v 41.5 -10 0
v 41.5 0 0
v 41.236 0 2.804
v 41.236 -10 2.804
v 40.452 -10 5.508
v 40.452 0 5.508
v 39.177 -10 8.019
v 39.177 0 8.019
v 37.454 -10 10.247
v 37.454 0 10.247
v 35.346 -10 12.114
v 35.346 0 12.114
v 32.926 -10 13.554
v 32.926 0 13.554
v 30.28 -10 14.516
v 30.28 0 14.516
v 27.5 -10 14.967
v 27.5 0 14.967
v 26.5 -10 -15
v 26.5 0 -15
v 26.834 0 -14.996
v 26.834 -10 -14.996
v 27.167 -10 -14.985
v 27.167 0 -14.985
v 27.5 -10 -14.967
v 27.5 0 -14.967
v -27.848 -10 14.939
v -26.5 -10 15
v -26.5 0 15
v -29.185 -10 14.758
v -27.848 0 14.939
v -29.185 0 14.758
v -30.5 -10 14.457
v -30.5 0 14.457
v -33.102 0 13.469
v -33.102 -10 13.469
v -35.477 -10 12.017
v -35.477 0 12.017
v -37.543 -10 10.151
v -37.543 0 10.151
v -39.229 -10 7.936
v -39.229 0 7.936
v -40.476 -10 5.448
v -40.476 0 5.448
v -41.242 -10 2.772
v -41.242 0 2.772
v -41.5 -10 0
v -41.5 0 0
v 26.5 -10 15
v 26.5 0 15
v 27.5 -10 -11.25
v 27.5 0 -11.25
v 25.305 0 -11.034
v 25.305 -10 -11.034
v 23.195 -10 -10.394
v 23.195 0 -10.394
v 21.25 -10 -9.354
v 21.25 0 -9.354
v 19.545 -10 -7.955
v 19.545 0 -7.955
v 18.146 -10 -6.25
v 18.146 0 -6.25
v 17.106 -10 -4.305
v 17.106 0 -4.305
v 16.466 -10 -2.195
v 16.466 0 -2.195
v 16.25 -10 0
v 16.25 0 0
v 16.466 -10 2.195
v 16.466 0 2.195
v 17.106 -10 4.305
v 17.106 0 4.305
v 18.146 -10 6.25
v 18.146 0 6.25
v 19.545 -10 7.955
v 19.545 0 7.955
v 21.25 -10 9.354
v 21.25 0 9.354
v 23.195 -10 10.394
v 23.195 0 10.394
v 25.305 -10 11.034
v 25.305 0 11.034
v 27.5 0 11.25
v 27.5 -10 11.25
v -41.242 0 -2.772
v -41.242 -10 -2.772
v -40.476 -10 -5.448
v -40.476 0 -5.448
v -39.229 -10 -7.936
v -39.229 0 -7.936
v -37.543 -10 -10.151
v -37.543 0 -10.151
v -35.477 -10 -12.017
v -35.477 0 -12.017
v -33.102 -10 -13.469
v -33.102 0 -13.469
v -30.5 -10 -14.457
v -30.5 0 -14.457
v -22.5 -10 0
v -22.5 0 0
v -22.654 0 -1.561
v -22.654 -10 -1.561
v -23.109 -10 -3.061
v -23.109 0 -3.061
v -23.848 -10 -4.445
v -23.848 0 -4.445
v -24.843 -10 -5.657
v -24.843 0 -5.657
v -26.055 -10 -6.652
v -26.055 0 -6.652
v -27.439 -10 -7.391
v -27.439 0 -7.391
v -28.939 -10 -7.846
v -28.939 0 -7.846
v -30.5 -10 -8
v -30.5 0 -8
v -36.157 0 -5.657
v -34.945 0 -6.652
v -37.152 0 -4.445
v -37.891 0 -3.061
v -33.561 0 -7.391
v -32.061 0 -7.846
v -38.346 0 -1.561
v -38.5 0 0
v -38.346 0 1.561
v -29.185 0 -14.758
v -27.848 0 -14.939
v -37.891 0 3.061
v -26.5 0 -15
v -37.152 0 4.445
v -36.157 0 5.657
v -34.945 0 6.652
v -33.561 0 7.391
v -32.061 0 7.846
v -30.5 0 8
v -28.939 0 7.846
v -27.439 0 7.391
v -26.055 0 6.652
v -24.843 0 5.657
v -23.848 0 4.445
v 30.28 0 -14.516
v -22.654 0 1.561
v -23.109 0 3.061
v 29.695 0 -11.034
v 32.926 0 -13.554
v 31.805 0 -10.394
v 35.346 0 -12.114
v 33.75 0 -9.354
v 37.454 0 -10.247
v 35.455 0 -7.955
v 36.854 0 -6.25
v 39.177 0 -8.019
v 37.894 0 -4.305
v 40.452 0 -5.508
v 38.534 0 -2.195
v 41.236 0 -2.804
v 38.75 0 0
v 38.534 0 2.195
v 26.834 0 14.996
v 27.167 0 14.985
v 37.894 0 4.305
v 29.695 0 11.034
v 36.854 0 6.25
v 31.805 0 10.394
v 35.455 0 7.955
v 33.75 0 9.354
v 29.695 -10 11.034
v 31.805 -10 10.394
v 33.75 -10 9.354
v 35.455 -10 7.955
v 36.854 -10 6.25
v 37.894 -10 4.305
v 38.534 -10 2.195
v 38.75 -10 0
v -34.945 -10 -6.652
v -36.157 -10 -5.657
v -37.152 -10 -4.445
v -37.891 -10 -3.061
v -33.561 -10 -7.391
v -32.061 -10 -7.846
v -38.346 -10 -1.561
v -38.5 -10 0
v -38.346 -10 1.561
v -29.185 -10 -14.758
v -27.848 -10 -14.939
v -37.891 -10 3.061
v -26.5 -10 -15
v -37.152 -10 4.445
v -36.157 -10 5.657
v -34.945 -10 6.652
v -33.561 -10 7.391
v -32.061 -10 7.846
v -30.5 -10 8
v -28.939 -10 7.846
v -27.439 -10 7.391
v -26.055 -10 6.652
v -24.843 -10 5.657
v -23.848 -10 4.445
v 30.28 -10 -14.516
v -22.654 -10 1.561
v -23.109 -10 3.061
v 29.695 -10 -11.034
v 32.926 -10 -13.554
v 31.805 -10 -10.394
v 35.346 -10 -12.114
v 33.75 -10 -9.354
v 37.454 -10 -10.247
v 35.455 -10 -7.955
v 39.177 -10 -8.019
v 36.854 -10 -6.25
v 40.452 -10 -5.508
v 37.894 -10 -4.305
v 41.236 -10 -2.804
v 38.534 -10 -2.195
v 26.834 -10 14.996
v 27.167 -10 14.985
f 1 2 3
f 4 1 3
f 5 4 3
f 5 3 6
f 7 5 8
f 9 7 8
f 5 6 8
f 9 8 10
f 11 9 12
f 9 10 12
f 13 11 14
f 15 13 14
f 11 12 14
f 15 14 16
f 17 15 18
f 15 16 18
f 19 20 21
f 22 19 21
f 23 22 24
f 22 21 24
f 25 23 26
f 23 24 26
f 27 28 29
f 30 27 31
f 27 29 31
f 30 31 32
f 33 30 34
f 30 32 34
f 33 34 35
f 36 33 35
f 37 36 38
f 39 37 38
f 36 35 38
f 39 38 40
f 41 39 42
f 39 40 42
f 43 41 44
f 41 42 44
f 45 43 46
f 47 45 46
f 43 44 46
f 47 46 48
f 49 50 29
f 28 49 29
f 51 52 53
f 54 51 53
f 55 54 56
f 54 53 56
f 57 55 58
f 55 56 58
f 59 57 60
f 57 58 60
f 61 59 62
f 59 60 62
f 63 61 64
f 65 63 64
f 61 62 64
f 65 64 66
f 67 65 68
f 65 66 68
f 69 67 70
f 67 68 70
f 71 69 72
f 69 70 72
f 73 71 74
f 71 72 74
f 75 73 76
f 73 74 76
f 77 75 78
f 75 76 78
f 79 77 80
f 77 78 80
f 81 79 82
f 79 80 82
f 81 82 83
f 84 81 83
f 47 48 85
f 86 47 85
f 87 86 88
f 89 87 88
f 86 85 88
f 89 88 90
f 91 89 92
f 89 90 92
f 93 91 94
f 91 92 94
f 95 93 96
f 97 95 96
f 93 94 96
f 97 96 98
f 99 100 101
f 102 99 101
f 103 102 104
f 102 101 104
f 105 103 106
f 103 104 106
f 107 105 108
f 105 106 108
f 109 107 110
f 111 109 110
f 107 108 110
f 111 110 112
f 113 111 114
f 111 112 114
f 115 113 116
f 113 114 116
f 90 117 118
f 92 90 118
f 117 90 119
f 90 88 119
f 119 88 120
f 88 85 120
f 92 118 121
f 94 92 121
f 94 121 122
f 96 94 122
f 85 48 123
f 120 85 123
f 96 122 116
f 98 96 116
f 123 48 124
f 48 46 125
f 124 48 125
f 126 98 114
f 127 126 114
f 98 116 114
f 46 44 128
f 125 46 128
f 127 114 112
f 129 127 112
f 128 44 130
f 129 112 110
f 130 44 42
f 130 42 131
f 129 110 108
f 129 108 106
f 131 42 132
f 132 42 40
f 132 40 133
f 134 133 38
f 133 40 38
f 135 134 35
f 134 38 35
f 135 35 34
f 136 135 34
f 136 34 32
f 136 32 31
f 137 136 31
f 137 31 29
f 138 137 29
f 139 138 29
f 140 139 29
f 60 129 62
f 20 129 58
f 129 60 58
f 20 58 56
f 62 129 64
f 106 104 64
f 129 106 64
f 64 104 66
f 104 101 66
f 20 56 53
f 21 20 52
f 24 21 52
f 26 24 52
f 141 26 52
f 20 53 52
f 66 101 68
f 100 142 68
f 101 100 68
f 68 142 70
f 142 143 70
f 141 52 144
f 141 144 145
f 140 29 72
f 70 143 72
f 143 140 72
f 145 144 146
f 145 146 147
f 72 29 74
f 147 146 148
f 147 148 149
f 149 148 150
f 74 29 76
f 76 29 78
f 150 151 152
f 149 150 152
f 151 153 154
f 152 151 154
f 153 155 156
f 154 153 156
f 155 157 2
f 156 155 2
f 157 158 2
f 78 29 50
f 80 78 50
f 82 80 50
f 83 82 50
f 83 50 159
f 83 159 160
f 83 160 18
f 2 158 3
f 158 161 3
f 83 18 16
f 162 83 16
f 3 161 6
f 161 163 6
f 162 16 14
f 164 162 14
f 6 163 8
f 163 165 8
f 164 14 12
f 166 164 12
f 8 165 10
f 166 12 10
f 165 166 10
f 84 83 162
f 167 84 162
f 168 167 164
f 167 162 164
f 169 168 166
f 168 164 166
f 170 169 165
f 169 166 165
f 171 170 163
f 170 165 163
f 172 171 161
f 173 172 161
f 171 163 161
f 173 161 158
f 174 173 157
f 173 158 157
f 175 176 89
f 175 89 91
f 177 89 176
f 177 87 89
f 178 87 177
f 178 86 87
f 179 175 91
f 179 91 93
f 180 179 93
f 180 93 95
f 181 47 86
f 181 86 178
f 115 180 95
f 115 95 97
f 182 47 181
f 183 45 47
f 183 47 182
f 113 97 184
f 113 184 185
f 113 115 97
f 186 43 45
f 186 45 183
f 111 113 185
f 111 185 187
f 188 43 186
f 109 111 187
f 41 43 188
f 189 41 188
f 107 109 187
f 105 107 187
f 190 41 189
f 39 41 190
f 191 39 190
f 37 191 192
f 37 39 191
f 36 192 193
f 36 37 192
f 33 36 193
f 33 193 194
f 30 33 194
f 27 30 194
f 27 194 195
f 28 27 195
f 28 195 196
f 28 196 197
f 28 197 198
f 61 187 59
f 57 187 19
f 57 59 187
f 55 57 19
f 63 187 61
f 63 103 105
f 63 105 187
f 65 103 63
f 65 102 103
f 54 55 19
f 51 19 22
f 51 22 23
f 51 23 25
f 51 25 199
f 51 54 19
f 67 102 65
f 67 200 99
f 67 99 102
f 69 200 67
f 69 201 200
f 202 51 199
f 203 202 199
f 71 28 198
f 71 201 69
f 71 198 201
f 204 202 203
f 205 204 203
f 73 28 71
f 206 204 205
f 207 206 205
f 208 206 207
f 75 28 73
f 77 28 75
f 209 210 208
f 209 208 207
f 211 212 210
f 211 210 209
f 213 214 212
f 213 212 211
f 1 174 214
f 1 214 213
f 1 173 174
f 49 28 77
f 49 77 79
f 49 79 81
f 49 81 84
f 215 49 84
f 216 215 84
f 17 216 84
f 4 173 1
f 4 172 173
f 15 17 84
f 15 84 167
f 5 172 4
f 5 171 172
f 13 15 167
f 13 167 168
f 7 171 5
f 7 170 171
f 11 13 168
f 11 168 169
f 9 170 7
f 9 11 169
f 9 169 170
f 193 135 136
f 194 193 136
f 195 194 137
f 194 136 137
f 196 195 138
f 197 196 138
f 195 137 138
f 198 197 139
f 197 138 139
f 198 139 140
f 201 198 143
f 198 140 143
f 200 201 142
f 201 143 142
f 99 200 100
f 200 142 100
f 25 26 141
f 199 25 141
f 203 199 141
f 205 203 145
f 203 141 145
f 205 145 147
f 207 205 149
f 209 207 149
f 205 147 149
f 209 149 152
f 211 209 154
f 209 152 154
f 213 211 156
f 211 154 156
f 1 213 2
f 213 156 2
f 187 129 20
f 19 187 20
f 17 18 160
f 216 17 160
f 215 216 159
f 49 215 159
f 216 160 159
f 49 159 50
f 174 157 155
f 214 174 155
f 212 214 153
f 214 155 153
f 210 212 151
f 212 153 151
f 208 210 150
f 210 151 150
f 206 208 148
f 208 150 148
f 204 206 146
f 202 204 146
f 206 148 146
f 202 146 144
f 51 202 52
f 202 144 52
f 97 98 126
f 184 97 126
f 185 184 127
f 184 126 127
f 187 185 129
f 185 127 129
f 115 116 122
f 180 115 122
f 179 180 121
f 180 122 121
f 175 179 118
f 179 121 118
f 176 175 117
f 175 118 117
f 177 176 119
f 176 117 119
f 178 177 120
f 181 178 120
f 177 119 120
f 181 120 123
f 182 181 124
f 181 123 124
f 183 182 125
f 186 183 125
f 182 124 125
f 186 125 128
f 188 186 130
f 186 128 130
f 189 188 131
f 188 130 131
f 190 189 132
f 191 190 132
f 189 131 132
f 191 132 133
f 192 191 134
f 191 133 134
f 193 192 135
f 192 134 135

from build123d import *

# Parameters (mm, degrees)
F1_DEPTH = 10


with BuildPart() as f1:
    # F0 (on Front) → F1 (new body)
    with BuildSketch(Plane.XZ):
        with BuildLine():
            Line((-26.5, -15), (26.5, -15))
            ThreePointArc((26.5, -15), (27.000278, -14.991655), (27.5, -14.96663))
            Line((27.5, -14.96663), (27.5, -11.25))
            ThreePointArc((27.5, -11.25), (16.25, 0), (27.5, 11.25))
            Line((27.5, 11.25), (27.5, 14.96663))
            ThreePointArc((27.5, 14.96663), (27.000278, 14.991655), (26.5, 15))
            Line((26.5, 15), (-26.5, 15))
            ThreePointArc((-26.5, 15), (-28.518355, 14.863588), (-30.5, 14.456832))
            Line((-30.5, 14.456832), (-30.5, 8))
            ThreePointArc((-30.5, 8), (-24.843146, 5.656854), (-22.5, 0))
            ThreePointArc((-22.5, 0), (-24.843146, -5.656854), (-30.5, -8))
            Line((-30.5, -8), (-30.5, -14.456832))
            ThreePointArc((-30.5, -14.456832), (-28.518355, -14.863588), (-26.5, -15))
        make_face()
        with BuildLine():
            Line((27.5, -11.25), (27.5, -14.96663))
            ThreePointArc((27.5, -14.96663), (37.454451, -10.246951), (41.5, 0))
            ThreePointArc((41.5, 0), (37.454451, 10.246951), (27.5, 14.96663))
            Line((27.5, 14.96663), (27.5, 11.25))
            ThreePointArc((27.5, 11.25), (35.454951, 7.954951), (38.75, 0))
            ThreePointArc((38.75, 0), (35.454951, -7.954951), (27.5, -11.25))
        make_face()
        with BuildLine():
            ThreePointArc((-41.5, 0), (-38.437336, -9.082951), (-30.5, -14.456832))
            Line((-30.5, -14.456832), (-30.5, -8))
            ThreePointArc((-30.5, -8), (-38.5, 0), (-30.5, 8))
            Line((-30.5, 8), (-30.5, 14.456832))
            ThreePointArc((-30.5, 14.456832), (-38.437336, 9.082951), (-41.5, 0))
        make_face()
    extrude(amount=F1_DEPTH)


solid = f1.part
